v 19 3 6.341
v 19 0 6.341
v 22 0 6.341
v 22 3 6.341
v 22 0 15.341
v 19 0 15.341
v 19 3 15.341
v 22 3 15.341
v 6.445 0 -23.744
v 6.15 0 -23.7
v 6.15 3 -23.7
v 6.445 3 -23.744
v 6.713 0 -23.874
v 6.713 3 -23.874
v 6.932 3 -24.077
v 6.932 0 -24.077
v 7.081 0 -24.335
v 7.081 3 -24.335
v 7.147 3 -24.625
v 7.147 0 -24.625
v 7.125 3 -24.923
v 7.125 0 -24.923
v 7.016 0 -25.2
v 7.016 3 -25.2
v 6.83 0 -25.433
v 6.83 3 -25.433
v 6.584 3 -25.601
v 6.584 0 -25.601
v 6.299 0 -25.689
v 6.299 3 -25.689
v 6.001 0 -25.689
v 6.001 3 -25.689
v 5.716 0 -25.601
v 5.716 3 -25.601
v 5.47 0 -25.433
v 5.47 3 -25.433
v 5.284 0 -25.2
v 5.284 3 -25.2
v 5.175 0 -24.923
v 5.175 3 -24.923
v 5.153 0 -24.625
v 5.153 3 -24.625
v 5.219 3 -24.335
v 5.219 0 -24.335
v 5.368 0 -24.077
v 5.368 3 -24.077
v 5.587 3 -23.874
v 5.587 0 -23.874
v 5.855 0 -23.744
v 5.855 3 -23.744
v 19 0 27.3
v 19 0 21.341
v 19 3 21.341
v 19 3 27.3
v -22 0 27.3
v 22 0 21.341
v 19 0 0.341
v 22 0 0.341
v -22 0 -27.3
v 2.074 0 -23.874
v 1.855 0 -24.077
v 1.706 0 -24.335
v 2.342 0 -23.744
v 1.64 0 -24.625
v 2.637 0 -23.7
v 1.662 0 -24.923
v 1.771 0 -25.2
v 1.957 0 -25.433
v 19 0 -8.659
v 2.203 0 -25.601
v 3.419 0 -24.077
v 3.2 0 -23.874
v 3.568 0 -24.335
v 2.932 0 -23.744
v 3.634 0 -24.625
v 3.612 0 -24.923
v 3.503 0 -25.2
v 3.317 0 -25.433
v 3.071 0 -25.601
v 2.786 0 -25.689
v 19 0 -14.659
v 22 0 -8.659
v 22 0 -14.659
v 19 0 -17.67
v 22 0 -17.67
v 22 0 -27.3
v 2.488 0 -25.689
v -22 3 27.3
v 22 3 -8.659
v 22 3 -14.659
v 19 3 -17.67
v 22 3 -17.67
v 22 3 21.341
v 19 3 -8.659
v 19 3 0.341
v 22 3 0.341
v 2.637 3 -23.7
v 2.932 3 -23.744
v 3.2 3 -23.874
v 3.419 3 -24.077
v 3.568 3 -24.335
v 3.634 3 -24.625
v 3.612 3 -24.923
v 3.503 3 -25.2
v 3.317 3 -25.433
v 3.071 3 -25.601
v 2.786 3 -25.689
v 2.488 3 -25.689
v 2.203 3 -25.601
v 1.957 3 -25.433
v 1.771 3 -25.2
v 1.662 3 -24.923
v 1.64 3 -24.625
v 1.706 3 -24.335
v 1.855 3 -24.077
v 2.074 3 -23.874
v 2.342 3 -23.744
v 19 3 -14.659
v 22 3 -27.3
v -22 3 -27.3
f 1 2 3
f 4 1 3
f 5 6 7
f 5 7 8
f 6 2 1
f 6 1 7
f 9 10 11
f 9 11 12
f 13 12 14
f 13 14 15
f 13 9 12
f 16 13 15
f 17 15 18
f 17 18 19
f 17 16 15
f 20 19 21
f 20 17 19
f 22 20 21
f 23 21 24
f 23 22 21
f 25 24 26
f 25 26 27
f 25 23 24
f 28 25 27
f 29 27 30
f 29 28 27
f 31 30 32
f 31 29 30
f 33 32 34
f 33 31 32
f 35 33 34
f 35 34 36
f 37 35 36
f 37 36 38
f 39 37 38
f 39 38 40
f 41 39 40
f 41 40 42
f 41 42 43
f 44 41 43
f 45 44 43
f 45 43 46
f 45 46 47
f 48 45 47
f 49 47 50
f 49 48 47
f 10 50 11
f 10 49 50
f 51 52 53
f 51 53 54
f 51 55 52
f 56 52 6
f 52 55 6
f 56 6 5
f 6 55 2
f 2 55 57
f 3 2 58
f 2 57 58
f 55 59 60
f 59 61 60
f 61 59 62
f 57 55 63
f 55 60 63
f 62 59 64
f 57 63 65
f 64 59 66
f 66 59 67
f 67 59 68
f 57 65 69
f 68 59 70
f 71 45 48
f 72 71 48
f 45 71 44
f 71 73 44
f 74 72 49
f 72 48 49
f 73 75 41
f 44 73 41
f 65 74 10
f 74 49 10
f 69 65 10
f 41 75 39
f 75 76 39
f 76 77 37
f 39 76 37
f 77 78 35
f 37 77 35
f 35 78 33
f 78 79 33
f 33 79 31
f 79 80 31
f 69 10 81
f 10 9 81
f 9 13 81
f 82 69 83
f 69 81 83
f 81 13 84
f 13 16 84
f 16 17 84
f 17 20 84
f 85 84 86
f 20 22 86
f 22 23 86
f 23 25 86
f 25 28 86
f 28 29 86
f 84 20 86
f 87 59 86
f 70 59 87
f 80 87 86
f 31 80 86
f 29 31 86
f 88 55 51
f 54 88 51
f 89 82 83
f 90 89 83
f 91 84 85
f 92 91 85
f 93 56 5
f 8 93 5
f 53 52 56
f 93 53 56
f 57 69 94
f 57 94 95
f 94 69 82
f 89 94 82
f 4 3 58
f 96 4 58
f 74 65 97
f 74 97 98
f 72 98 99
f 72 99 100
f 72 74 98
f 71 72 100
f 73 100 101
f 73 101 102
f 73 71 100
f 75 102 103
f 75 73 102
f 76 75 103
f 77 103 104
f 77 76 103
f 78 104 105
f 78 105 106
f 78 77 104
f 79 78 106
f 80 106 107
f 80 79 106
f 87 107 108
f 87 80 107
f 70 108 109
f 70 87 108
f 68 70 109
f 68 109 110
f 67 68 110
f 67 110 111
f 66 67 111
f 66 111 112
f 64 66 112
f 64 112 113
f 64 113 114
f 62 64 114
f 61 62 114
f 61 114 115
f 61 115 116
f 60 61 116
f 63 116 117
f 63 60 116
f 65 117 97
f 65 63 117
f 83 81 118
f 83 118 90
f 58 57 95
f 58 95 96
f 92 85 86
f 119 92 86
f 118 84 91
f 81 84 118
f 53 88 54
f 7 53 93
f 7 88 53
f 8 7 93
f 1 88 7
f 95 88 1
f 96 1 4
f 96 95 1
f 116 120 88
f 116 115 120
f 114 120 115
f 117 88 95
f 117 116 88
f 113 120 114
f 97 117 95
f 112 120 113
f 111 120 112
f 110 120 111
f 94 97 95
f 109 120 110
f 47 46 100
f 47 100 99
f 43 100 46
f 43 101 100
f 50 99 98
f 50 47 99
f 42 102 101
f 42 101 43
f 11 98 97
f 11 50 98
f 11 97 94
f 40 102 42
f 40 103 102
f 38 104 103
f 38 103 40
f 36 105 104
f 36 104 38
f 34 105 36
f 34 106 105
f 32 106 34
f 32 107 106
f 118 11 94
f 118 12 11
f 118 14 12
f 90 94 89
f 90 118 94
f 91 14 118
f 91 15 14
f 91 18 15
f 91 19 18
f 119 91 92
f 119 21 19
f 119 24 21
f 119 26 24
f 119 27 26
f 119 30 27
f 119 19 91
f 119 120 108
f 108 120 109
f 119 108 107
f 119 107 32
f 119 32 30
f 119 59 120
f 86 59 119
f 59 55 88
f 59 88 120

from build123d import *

# Parameters (mm, degrees)
SKETCH1_W           = 44
SKETCH1_H           = 54.6
SKETCH1_R           = 1
BOSS_EXTRUDE1_DEPTH = 3
SKETCH2_W           = 3
SKETCH2_H           = 3.011475899
SKETCH2_H_2         = 9
SKETCH2_H_3         = 5.958851055
CUT_EXTRUDE2_DEPTH  = 10


with BuildPart() as part:
    # Sketch1 → Boss-Extrude1 (new body)
    with BuildSketch(Plane(origin=(0, 0, 0), x_dir=(1, 0, 0), z_dir=(0, 1, 0))):
        Rectangle(SKETCH1_W, SKETCH1_H)
        with Locations(Location((2.636984901, 24.7, 0), (0, 0, 270))):
            Circle(SKETCH1_R, mode=Mode.SUBTRACT)
        with Locations(Location((6.15, 24.7, 0), (0, 0, 270))):
            Circle(SKETCH1_R, mode=Mode.SUBTRACT)
    extrude(amount=BOSS_EXTRUDE1_DEPTH)

    # Sketch2 → Cut-Extrude2 (cut)
    with BuildSketch(Plane.XZ):
        with Locations((20.5, -16.164589005)):
            Rectangle(SKETCH2_W, SKETCH2_H)
        with Locations((20.5, -4.158851055)):
            Rectangle(SKETCH2_W, SKETCH2_H_2)
        with Locations((20.5, 10.841148945)):
            Rectangle(SKETCH2_W, SKETCH2_H_2)
        with Locations((20.5, 24.320574472)):
            Rectangle(SKETCH2_W, SKETCH2_H_3)
    extrude(amount=-CUT_EXTRUDE2_DEPTH, mode=Mode.SUBTRACT)


solid = part.part
